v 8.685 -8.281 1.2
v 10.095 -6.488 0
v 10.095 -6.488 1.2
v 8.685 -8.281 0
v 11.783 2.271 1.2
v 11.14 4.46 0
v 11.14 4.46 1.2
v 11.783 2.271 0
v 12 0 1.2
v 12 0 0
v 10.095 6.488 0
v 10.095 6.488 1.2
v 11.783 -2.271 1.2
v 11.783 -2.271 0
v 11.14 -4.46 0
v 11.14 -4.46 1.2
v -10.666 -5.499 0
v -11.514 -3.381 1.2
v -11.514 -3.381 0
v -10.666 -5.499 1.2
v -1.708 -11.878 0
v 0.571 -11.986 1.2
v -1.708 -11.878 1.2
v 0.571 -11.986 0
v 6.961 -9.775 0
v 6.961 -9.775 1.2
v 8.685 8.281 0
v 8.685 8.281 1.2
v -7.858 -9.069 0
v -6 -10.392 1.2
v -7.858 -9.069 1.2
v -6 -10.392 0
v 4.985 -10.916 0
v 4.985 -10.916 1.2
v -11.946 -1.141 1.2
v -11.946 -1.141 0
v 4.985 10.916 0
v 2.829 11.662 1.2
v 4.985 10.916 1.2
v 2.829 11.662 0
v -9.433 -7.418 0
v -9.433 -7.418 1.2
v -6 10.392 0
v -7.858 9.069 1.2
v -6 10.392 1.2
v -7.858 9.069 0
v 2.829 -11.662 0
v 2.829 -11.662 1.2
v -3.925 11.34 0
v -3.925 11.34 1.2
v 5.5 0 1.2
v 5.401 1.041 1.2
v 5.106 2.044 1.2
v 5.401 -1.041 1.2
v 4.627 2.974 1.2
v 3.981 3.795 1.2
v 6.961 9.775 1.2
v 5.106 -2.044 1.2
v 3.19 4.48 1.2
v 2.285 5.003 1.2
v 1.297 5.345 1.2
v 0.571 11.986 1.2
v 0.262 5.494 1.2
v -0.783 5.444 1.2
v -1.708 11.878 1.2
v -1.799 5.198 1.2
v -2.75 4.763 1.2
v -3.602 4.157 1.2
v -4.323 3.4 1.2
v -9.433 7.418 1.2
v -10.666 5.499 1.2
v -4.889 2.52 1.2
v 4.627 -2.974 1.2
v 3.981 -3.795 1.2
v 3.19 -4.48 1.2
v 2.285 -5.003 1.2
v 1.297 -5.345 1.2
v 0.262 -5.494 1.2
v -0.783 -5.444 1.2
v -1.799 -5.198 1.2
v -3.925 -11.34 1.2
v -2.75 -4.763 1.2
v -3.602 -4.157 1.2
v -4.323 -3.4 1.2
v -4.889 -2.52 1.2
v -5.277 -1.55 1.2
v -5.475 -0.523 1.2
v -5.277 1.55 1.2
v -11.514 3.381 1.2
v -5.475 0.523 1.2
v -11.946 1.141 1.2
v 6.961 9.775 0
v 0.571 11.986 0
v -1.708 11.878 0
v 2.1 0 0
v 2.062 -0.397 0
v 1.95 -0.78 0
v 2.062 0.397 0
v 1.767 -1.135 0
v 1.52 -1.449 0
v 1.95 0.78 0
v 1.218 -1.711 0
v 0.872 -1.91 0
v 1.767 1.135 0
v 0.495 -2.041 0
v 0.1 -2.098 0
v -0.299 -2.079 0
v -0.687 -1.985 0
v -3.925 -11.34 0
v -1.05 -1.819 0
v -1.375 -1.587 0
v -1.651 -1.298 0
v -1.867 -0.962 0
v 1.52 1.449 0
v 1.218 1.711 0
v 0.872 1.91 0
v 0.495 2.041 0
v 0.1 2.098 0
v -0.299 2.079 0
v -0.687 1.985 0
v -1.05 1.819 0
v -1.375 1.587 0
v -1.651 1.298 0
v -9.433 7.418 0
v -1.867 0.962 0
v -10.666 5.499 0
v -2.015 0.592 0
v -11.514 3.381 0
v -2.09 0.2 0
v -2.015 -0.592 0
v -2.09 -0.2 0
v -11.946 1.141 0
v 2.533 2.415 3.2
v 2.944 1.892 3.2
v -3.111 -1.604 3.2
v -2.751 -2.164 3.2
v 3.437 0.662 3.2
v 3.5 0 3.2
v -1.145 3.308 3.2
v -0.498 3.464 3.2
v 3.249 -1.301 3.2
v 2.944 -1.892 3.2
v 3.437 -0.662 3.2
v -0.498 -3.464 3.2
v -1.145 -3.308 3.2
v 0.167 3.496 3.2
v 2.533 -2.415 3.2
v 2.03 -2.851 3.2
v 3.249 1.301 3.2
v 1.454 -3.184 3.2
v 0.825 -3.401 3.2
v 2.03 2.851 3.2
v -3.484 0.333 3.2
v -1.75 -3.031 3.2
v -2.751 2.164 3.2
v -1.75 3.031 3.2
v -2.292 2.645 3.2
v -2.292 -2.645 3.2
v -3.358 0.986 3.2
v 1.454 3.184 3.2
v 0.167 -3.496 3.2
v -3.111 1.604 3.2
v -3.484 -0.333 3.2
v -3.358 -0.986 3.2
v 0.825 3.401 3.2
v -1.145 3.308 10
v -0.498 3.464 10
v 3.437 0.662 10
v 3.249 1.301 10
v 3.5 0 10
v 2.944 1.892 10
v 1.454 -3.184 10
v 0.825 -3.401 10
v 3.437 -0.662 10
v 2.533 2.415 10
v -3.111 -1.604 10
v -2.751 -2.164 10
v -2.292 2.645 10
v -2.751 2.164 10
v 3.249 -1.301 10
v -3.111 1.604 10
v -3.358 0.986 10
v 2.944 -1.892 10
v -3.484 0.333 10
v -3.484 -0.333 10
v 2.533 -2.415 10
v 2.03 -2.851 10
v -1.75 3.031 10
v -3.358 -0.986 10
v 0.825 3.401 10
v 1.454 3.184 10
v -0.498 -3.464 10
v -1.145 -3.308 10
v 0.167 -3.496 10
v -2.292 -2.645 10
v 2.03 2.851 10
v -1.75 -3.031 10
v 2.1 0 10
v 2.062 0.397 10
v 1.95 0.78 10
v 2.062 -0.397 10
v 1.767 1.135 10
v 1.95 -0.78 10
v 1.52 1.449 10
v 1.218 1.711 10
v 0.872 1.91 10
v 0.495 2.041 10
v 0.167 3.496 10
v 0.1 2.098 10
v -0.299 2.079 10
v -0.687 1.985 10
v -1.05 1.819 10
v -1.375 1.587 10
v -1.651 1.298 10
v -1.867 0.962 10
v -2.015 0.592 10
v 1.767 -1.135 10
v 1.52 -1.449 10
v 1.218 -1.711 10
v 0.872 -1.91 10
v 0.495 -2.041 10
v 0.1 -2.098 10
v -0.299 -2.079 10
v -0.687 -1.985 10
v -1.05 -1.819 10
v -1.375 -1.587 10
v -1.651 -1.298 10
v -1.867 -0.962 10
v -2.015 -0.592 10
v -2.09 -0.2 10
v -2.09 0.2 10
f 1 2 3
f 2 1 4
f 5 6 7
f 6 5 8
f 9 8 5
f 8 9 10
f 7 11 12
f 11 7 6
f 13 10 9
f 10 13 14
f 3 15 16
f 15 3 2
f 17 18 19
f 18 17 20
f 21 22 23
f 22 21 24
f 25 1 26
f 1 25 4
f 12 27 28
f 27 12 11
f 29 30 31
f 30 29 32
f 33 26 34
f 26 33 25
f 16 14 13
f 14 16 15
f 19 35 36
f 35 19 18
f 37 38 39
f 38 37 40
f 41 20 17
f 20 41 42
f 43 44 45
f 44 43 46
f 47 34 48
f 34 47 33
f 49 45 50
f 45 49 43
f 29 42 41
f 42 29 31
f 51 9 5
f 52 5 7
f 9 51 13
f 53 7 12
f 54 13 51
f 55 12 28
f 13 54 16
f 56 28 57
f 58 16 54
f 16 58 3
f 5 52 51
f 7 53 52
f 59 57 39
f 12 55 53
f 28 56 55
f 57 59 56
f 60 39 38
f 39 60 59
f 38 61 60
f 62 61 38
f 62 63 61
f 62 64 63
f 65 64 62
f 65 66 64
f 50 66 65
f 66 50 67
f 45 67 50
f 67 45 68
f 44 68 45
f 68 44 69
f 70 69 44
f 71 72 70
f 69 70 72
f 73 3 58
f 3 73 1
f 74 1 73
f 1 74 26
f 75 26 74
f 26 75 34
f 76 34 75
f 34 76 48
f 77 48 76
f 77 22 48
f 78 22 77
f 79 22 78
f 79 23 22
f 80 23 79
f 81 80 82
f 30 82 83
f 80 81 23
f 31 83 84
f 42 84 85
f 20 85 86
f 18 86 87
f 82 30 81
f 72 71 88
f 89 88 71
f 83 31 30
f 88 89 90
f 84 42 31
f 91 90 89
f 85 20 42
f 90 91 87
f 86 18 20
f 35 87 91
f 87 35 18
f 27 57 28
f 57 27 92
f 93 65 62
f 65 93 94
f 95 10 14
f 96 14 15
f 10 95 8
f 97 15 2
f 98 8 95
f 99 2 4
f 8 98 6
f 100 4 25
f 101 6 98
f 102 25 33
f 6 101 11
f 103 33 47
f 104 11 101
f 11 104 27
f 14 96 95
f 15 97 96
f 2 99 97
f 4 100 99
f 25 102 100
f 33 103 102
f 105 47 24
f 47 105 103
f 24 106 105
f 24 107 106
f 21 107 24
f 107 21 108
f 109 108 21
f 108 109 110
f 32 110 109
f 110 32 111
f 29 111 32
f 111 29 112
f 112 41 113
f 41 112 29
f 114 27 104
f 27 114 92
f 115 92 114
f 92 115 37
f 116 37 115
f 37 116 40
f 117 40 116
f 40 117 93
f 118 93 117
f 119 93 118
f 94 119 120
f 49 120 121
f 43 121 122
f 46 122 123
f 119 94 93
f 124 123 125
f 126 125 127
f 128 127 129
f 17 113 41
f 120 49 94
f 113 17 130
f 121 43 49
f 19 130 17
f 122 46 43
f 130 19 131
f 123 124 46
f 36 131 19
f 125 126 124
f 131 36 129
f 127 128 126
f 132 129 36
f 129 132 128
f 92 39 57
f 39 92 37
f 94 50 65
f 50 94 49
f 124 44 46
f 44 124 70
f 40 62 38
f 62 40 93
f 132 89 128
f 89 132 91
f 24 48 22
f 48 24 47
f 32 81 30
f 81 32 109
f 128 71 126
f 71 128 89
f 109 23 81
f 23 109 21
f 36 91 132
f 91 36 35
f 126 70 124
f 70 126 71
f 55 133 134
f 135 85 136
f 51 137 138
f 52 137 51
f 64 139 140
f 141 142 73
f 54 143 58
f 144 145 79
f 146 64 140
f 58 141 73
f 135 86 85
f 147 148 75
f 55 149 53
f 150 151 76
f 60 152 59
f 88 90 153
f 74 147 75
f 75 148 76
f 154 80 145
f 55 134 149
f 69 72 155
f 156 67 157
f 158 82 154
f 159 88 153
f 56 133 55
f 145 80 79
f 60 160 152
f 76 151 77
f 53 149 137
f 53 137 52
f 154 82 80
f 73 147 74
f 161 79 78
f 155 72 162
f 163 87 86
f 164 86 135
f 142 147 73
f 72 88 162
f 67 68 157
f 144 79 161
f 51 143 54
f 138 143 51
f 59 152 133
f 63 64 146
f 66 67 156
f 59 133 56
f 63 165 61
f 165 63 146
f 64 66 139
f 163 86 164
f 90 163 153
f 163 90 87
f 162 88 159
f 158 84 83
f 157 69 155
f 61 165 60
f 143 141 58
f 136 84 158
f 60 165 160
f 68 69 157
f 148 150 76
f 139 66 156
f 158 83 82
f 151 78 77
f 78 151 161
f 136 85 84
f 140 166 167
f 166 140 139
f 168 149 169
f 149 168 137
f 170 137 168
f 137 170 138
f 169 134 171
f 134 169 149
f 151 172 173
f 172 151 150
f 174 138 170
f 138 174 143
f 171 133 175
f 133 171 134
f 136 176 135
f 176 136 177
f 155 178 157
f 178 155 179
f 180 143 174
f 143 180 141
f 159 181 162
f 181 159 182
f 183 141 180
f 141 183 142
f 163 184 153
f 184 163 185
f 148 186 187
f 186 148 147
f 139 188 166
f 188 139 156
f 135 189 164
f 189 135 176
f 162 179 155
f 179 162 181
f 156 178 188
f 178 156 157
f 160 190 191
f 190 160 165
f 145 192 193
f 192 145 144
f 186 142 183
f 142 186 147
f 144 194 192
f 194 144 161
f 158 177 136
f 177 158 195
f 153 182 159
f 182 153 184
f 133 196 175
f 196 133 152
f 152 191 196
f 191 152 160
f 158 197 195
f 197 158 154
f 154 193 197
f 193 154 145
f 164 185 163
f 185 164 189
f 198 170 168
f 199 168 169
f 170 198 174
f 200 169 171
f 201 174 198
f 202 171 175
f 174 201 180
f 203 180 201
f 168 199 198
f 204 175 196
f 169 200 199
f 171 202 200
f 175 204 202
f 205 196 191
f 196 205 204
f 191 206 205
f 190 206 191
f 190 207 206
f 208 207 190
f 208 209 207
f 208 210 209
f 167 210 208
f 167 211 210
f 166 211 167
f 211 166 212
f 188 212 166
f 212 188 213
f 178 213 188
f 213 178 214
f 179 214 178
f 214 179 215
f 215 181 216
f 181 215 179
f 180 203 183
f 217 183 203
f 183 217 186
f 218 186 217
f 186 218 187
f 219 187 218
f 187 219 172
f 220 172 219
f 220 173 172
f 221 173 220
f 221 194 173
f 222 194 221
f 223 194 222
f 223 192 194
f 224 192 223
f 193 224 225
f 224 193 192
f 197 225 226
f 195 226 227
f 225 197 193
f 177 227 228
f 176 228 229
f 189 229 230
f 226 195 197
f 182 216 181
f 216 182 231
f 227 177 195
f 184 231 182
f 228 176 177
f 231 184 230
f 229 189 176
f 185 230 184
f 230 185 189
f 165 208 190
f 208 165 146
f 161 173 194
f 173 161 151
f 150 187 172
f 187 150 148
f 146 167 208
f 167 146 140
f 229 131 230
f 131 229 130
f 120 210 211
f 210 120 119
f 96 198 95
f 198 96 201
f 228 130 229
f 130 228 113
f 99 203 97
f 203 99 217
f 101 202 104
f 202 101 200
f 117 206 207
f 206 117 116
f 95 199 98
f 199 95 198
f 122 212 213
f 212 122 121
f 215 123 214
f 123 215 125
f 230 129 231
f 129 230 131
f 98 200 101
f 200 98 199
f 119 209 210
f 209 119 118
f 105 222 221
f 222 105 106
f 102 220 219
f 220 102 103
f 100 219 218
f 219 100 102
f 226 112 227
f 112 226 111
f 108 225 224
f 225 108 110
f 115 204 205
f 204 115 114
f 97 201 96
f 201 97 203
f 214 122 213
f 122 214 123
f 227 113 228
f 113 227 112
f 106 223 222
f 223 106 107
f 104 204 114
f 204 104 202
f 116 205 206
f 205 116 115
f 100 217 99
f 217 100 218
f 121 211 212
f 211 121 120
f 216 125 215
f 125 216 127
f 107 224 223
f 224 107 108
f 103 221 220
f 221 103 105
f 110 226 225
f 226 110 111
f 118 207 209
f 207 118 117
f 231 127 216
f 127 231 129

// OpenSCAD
//======================================================================
// mmu_tube_fix.scad
//
//
// DrTomFlint 28 July 2024
//
//======================================================================


thick=1.2;
wide=12;
high=10;

F1=99;
F2=33;

//----------------------------------------------------------------------
module fix(){

  difference(){
    union(){    
      cylinder(r=wide,h=thick,$fn=F2);
      translate([0,0,thick])
      cylinder(r1=7/2+2,r2=7/2,h=2,$fn=F2);
      cylinder(r=7/2,h=high,$fn=F2);
    }
    cylinder(r=2.1,h=3*high,center=true,$fn=F2);
  }
  
}

//======================================================================

fix();


//======================================================================
